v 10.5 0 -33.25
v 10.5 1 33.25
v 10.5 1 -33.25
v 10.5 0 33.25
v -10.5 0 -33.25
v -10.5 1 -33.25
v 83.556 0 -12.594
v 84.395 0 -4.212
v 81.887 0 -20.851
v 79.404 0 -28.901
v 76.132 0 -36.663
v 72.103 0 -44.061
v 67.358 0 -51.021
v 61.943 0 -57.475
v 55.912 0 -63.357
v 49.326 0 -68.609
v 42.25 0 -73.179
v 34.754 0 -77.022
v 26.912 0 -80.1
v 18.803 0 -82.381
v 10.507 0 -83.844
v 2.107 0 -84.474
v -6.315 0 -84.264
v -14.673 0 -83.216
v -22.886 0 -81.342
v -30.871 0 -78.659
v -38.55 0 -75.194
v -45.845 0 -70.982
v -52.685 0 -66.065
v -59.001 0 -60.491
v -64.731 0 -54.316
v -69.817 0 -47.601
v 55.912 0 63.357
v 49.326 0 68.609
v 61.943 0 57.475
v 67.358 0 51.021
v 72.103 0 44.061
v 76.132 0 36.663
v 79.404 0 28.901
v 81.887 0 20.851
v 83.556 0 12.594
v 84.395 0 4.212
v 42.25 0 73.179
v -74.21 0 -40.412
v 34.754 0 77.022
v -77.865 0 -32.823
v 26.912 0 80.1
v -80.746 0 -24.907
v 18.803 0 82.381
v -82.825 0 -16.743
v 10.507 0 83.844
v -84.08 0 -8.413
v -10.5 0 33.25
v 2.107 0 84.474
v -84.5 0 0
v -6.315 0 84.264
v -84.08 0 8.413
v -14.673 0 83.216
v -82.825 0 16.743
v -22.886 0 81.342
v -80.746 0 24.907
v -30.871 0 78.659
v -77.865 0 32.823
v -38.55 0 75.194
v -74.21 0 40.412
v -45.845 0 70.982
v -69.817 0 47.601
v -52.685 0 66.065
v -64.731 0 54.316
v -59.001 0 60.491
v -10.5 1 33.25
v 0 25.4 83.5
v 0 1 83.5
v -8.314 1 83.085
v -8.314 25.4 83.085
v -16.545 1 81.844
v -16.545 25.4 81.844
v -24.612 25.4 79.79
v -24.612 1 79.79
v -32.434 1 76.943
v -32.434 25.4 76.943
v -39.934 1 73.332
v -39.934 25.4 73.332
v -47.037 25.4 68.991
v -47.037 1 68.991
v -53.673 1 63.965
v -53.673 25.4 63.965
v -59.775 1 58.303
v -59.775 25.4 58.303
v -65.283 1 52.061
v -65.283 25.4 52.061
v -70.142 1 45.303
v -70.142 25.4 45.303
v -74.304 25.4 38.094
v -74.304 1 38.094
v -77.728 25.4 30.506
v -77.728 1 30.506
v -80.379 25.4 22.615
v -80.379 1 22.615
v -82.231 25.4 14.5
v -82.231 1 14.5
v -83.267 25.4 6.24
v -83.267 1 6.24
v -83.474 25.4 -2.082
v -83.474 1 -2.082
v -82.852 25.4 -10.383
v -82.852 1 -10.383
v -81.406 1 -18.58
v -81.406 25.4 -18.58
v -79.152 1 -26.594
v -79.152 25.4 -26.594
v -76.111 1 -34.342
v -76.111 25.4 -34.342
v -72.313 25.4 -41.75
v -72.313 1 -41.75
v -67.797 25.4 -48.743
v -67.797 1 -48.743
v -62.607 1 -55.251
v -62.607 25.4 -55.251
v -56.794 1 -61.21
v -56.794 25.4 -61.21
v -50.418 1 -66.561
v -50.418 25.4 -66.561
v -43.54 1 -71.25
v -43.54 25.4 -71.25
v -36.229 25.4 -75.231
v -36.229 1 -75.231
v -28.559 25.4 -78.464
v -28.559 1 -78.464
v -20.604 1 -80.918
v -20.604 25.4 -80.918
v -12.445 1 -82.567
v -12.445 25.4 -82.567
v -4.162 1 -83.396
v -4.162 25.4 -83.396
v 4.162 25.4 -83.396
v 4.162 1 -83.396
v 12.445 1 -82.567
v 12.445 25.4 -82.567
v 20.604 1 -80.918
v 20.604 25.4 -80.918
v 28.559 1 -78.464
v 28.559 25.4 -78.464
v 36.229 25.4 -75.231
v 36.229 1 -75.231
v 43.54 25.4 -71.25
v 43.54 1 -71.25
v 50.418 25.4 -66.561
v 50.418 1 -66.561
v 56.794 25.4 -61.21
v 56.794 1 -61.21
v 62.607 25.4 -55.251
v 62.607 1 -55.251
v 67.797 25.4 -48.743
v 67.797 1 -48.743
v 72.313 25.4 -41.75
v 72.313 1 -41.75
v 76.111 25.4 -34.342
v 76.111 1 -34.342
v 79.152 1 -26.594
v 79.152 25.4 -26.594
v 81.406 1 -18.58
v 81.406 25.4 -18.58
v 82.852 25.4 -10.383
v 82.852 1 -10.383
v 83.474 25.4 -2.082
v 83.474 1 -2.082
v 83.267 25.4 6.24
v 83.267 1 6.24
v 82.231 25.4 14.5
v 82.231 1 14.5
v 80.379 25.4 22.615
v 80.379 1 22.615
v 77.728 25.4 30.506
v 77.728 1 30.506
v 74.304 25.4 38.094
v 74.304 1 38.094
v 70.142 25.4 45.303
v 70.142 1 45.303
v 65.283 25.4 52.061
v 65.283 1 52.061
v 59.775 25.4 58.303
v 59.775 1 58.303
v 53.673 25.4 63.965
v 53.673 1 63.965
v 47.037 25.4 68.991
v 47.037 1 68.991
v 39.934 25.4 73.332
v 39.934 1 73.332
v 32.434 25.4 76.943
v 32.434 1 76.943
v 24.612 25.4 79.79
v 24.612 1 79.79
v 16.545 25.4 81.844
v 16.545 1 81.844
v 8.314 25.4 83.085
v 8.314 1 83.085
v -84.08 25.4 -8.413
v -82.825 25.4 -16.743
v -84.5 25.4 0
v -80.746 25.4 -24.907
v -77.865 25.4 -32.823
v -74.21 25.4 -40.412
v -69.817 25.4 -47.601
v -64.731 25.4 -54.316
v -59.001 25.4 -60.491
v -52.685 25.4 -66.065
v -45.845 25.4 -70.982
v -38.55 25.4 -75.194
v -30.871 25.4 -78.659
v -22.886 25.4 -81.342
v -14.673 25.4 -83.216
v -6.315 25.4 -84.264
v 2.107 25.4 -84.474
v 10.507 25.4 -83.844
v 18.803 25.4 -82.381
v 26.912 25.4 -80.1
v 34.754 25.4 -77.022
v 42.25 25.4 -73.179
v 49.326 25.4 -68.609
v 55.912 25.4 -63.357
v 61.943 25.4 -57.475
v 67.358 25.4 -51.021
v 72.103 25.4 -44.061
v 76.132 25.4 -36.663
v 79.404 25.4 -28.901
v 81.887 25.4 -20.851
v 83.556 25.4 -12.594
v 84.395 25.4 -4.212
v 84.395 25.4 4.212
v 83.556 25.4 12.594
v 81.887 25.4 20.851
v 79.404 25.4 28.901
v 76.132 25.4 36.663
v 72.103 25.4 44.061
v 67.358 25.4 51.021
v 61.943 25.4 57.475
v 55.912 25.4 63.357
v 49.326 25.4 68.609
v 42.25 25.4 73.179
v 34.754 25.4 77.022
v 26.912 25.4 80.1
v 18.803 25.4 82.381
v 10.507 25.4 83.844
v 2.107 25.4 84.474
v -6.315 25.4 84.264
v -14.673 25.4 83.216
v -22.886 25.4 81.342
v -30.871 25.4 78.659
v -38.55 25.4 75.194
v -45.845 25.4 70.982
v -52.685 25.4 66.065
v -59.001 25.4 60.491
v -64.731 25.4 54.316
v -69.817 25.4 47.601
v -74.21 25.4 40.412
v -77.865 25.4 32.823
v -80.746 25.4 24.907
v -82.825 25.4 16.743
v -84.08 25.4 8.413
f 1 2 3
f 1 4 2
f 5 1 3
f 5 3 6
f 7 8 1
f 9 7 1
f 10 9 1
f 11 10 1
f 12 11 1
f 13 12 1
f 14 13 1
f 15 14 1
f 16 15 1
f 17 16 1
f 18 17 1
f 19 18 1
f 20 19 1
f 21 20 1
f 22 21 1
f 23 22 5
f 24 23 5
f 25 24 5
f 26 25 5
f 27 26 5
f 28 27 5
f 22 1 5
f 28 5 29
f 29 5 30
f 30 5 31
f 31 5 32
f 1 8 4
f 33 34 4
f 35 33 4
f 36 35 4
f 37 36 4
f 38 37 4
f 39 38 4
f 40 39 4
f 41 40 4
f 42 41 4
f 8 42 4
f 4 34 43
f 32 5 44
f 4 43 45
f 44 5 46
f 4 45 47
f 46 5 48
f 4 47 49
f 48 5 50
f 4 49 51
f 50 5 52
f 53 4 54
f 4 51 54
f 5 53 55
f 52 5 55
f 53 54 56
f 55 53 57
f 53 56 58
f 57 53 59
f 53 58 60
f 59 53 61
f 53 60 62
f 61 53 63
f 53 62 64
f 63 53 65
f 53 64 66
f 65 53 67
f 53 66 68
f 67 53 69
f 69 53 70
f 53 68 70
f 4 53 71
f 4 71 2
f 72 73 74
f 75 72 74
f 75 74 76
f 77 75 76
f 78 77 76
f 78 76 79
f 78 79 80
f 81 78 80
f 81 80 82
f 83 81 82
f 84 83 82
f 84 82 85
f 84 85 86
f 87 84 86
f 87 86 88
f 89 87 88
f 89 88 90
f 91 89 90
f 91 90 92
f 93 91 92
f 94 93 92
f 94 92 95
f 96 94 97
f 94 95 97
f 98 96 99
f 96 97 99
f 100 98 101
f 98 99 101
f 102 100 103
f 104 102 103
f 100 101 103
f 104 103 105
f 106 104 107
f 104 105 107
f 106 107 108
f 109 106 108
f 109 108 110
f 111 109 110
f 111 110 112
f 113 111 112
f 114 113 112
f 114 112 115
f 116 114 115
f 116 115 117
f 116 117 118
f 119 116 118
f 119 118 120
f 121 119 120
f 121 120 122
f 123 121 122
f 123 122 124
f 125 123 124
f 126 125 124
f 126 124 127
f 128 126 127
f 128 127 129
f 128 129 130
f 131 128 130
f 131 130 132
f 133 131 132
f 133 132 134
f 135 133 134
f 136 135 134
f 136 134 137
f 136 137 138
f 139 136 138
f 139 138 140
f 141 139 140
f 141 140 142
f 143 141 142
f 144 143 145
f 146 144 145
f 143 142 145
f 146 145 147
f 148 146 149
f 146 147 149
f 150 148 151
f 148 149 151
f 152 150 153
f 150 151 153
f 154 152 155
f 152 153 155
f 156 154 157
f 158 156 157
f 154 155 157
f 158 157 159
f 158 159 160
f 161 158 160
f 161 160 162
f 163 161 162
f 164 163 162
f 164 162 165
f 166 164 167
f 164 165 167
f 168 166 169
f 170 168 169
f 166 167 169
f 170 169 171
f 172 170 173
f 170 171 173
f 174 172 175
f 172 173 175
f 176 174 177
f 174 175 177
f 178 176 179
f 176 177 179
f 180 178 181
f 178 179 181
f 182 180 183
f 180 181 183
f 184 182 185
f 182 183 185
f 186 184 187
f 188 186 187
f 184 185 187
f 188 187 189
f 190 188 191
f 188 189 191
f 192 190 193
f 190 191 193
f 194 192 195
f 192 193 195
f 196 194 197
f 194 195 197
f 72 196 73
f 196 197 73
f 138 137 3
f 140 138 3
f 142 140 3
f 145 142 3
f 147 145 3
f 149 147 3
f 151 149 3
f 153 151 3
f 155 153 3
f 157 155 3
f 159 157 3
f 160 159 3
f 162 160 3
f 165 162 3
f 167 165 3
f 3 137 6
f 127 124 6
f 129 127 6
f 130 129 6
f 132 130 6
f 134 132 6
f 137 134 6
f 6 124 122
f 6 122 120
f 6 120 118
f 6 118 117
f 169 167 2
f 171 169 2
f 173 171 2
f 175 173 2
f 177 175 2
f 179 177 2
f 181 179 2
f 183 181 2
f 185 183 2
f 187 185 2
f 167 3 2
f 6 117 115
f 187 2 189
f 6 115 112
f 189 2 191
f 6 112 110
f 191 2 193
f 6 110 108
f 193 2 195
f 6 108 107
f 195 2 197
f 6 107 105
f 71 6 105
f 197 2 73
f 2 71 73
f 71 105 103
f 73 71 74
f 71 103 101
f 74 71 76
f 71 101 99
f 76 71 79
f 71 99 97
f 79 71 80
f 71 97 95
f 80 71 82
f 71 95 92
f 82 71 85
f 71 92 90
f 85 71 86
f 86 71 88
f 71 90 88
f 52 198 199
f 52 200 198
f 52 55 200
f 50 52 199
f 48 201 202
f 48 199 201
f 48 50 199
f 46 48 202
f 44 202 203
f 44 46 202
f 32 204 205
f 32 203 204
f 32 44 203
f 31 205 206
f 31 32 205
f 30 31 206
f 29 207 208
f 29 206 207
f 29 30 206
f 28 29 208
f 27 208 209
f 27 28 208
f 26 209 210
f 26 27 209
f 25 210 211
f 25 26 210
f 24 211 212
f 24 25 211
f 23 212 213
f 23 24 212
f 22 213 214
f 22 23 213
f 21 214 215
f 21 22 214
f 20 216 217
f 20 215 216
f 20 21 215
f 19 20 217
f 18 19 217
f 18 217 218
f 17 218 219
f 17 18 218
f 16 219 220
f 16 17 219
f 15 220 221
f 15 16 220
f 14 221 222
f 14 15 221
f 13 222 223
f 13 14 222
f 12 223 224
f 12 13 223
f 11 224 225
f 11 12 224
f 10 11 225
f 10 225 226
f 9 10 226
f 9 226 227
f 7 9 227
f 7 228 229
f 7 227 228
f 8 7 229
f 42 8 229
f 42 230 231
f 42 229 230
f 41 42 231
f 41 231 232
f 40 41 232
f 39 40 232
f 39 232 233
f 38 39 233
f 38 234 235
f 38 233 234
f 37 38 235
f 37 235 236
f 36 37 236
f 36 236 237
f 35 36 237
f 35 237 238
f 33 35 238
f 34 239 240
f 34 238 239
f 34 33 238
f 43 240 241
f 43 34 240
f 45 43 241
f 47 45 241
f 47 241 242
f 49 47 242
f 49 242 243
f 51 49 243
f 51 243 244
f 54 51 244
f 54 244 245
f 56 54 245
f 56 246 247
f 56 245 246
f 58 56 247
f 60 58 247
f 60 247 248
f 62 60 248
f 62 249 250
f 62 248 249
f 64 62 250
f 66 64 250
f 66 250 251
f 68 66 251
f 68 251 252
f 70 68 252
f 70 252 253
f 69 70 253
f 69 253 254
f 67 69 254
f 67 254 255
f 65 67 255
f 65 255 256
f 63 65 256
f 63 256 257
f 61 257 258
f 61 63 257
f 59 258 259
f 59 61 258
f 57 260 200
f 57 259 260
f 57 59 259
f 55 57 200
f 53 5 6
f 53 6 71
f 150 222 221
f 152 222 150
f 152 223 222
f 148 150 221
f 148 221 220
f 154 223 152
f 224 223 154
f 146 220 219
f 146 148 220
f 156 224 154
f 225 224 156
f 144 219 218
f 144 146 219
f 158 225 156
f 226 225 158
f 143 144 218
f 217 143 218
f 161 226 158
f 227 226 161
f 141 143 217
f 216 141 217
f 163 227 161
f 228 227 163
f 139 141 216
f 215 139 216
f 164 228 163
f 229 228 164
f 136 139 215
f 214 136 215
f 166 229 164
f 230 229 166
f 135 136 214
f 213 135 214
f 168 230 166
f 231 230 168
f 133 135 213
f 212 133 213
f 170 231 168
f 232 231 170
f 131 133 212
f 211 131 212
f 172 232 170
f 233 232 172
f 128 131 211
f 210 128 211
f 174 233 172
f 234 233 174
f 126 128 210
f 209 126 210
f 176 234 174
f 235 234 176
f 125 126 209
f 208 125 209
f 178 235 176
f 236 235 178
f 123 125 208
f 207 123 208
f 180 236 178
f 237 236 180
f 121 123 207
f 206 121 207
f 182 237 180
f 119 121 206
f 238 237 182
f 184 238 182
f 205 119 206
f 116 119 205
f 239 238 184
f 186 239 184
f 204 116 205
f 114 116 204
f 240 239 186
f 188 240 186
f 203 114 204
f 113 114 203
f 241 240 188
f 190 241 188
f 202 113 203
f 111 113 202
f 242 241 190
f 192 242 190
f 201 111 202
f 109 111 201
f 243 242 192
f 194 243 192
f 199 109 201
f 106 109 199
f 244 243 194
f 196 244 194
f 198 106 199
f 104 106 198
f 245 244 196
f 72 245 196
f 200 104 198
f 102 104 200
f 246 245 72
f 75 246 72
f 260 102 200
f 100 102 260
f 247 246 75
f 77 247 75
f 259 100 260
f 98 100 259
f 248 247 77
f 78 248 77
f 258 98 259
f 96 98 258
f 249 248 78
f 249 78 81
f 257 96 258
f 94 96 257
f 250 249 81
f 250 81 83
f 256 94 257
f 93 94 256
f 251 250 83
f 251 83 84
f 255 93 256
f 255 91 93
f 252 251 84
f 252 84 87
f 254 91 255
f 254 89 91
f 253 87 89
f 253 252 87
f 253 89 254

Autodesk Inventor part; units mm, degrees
ref_plane "XZ Plane" through (0, 0, 0) normal (0, 1, 0) x (-1, 0, 0)
ref_plane "XY Plane" through (0, 0, 0) normal (0, 0, 1) x (1, 0, 0)
sketch "Sketch1" plane through (0, 0, 0) normal (0, 1, 0) x (-1, 0, 0)
  circle A0 centre (0, 0) radius 84.5
  line L0 (10.5, 33.25) -> (-10.5, 33.25)
  line L1 (-10.5, 33.25) -> (-10.5, -33.25)
  line L2 (-10.5, -33.25) -> (10.5, -33.25)
  line L3 (10.5, -33.25) -> (10.5, 33.25)
  line L4 (10.5, 33.25) -> (-10.5, -33.25) construction
  line L5 (-10.5, 33.25) -> (10.5, -33.25) construction
  dimension "d0" = 169
  dimension "d1" = 21
  dimension "d2" = 66.5
ref_plane "Work Plane1" through (0, 0, 0) normal (1, 0, 0) x (0, 1, 0)
extrude "Extrusion2" add sketch "Sketch1" along normal blind 25.4
sketch "Sketch3" plane through (0, 25.4, 0) normal (0, 1, 0) x (1, 0, 0)
  circle A0 centre (0, 0) radius 83.5
  dimension "d63" = 167
hole "Hole2" at (0, 25.4, 0) direction (0, -1, 0) diameter 167 depth 24.4
properties part number "Bottom Cap"
